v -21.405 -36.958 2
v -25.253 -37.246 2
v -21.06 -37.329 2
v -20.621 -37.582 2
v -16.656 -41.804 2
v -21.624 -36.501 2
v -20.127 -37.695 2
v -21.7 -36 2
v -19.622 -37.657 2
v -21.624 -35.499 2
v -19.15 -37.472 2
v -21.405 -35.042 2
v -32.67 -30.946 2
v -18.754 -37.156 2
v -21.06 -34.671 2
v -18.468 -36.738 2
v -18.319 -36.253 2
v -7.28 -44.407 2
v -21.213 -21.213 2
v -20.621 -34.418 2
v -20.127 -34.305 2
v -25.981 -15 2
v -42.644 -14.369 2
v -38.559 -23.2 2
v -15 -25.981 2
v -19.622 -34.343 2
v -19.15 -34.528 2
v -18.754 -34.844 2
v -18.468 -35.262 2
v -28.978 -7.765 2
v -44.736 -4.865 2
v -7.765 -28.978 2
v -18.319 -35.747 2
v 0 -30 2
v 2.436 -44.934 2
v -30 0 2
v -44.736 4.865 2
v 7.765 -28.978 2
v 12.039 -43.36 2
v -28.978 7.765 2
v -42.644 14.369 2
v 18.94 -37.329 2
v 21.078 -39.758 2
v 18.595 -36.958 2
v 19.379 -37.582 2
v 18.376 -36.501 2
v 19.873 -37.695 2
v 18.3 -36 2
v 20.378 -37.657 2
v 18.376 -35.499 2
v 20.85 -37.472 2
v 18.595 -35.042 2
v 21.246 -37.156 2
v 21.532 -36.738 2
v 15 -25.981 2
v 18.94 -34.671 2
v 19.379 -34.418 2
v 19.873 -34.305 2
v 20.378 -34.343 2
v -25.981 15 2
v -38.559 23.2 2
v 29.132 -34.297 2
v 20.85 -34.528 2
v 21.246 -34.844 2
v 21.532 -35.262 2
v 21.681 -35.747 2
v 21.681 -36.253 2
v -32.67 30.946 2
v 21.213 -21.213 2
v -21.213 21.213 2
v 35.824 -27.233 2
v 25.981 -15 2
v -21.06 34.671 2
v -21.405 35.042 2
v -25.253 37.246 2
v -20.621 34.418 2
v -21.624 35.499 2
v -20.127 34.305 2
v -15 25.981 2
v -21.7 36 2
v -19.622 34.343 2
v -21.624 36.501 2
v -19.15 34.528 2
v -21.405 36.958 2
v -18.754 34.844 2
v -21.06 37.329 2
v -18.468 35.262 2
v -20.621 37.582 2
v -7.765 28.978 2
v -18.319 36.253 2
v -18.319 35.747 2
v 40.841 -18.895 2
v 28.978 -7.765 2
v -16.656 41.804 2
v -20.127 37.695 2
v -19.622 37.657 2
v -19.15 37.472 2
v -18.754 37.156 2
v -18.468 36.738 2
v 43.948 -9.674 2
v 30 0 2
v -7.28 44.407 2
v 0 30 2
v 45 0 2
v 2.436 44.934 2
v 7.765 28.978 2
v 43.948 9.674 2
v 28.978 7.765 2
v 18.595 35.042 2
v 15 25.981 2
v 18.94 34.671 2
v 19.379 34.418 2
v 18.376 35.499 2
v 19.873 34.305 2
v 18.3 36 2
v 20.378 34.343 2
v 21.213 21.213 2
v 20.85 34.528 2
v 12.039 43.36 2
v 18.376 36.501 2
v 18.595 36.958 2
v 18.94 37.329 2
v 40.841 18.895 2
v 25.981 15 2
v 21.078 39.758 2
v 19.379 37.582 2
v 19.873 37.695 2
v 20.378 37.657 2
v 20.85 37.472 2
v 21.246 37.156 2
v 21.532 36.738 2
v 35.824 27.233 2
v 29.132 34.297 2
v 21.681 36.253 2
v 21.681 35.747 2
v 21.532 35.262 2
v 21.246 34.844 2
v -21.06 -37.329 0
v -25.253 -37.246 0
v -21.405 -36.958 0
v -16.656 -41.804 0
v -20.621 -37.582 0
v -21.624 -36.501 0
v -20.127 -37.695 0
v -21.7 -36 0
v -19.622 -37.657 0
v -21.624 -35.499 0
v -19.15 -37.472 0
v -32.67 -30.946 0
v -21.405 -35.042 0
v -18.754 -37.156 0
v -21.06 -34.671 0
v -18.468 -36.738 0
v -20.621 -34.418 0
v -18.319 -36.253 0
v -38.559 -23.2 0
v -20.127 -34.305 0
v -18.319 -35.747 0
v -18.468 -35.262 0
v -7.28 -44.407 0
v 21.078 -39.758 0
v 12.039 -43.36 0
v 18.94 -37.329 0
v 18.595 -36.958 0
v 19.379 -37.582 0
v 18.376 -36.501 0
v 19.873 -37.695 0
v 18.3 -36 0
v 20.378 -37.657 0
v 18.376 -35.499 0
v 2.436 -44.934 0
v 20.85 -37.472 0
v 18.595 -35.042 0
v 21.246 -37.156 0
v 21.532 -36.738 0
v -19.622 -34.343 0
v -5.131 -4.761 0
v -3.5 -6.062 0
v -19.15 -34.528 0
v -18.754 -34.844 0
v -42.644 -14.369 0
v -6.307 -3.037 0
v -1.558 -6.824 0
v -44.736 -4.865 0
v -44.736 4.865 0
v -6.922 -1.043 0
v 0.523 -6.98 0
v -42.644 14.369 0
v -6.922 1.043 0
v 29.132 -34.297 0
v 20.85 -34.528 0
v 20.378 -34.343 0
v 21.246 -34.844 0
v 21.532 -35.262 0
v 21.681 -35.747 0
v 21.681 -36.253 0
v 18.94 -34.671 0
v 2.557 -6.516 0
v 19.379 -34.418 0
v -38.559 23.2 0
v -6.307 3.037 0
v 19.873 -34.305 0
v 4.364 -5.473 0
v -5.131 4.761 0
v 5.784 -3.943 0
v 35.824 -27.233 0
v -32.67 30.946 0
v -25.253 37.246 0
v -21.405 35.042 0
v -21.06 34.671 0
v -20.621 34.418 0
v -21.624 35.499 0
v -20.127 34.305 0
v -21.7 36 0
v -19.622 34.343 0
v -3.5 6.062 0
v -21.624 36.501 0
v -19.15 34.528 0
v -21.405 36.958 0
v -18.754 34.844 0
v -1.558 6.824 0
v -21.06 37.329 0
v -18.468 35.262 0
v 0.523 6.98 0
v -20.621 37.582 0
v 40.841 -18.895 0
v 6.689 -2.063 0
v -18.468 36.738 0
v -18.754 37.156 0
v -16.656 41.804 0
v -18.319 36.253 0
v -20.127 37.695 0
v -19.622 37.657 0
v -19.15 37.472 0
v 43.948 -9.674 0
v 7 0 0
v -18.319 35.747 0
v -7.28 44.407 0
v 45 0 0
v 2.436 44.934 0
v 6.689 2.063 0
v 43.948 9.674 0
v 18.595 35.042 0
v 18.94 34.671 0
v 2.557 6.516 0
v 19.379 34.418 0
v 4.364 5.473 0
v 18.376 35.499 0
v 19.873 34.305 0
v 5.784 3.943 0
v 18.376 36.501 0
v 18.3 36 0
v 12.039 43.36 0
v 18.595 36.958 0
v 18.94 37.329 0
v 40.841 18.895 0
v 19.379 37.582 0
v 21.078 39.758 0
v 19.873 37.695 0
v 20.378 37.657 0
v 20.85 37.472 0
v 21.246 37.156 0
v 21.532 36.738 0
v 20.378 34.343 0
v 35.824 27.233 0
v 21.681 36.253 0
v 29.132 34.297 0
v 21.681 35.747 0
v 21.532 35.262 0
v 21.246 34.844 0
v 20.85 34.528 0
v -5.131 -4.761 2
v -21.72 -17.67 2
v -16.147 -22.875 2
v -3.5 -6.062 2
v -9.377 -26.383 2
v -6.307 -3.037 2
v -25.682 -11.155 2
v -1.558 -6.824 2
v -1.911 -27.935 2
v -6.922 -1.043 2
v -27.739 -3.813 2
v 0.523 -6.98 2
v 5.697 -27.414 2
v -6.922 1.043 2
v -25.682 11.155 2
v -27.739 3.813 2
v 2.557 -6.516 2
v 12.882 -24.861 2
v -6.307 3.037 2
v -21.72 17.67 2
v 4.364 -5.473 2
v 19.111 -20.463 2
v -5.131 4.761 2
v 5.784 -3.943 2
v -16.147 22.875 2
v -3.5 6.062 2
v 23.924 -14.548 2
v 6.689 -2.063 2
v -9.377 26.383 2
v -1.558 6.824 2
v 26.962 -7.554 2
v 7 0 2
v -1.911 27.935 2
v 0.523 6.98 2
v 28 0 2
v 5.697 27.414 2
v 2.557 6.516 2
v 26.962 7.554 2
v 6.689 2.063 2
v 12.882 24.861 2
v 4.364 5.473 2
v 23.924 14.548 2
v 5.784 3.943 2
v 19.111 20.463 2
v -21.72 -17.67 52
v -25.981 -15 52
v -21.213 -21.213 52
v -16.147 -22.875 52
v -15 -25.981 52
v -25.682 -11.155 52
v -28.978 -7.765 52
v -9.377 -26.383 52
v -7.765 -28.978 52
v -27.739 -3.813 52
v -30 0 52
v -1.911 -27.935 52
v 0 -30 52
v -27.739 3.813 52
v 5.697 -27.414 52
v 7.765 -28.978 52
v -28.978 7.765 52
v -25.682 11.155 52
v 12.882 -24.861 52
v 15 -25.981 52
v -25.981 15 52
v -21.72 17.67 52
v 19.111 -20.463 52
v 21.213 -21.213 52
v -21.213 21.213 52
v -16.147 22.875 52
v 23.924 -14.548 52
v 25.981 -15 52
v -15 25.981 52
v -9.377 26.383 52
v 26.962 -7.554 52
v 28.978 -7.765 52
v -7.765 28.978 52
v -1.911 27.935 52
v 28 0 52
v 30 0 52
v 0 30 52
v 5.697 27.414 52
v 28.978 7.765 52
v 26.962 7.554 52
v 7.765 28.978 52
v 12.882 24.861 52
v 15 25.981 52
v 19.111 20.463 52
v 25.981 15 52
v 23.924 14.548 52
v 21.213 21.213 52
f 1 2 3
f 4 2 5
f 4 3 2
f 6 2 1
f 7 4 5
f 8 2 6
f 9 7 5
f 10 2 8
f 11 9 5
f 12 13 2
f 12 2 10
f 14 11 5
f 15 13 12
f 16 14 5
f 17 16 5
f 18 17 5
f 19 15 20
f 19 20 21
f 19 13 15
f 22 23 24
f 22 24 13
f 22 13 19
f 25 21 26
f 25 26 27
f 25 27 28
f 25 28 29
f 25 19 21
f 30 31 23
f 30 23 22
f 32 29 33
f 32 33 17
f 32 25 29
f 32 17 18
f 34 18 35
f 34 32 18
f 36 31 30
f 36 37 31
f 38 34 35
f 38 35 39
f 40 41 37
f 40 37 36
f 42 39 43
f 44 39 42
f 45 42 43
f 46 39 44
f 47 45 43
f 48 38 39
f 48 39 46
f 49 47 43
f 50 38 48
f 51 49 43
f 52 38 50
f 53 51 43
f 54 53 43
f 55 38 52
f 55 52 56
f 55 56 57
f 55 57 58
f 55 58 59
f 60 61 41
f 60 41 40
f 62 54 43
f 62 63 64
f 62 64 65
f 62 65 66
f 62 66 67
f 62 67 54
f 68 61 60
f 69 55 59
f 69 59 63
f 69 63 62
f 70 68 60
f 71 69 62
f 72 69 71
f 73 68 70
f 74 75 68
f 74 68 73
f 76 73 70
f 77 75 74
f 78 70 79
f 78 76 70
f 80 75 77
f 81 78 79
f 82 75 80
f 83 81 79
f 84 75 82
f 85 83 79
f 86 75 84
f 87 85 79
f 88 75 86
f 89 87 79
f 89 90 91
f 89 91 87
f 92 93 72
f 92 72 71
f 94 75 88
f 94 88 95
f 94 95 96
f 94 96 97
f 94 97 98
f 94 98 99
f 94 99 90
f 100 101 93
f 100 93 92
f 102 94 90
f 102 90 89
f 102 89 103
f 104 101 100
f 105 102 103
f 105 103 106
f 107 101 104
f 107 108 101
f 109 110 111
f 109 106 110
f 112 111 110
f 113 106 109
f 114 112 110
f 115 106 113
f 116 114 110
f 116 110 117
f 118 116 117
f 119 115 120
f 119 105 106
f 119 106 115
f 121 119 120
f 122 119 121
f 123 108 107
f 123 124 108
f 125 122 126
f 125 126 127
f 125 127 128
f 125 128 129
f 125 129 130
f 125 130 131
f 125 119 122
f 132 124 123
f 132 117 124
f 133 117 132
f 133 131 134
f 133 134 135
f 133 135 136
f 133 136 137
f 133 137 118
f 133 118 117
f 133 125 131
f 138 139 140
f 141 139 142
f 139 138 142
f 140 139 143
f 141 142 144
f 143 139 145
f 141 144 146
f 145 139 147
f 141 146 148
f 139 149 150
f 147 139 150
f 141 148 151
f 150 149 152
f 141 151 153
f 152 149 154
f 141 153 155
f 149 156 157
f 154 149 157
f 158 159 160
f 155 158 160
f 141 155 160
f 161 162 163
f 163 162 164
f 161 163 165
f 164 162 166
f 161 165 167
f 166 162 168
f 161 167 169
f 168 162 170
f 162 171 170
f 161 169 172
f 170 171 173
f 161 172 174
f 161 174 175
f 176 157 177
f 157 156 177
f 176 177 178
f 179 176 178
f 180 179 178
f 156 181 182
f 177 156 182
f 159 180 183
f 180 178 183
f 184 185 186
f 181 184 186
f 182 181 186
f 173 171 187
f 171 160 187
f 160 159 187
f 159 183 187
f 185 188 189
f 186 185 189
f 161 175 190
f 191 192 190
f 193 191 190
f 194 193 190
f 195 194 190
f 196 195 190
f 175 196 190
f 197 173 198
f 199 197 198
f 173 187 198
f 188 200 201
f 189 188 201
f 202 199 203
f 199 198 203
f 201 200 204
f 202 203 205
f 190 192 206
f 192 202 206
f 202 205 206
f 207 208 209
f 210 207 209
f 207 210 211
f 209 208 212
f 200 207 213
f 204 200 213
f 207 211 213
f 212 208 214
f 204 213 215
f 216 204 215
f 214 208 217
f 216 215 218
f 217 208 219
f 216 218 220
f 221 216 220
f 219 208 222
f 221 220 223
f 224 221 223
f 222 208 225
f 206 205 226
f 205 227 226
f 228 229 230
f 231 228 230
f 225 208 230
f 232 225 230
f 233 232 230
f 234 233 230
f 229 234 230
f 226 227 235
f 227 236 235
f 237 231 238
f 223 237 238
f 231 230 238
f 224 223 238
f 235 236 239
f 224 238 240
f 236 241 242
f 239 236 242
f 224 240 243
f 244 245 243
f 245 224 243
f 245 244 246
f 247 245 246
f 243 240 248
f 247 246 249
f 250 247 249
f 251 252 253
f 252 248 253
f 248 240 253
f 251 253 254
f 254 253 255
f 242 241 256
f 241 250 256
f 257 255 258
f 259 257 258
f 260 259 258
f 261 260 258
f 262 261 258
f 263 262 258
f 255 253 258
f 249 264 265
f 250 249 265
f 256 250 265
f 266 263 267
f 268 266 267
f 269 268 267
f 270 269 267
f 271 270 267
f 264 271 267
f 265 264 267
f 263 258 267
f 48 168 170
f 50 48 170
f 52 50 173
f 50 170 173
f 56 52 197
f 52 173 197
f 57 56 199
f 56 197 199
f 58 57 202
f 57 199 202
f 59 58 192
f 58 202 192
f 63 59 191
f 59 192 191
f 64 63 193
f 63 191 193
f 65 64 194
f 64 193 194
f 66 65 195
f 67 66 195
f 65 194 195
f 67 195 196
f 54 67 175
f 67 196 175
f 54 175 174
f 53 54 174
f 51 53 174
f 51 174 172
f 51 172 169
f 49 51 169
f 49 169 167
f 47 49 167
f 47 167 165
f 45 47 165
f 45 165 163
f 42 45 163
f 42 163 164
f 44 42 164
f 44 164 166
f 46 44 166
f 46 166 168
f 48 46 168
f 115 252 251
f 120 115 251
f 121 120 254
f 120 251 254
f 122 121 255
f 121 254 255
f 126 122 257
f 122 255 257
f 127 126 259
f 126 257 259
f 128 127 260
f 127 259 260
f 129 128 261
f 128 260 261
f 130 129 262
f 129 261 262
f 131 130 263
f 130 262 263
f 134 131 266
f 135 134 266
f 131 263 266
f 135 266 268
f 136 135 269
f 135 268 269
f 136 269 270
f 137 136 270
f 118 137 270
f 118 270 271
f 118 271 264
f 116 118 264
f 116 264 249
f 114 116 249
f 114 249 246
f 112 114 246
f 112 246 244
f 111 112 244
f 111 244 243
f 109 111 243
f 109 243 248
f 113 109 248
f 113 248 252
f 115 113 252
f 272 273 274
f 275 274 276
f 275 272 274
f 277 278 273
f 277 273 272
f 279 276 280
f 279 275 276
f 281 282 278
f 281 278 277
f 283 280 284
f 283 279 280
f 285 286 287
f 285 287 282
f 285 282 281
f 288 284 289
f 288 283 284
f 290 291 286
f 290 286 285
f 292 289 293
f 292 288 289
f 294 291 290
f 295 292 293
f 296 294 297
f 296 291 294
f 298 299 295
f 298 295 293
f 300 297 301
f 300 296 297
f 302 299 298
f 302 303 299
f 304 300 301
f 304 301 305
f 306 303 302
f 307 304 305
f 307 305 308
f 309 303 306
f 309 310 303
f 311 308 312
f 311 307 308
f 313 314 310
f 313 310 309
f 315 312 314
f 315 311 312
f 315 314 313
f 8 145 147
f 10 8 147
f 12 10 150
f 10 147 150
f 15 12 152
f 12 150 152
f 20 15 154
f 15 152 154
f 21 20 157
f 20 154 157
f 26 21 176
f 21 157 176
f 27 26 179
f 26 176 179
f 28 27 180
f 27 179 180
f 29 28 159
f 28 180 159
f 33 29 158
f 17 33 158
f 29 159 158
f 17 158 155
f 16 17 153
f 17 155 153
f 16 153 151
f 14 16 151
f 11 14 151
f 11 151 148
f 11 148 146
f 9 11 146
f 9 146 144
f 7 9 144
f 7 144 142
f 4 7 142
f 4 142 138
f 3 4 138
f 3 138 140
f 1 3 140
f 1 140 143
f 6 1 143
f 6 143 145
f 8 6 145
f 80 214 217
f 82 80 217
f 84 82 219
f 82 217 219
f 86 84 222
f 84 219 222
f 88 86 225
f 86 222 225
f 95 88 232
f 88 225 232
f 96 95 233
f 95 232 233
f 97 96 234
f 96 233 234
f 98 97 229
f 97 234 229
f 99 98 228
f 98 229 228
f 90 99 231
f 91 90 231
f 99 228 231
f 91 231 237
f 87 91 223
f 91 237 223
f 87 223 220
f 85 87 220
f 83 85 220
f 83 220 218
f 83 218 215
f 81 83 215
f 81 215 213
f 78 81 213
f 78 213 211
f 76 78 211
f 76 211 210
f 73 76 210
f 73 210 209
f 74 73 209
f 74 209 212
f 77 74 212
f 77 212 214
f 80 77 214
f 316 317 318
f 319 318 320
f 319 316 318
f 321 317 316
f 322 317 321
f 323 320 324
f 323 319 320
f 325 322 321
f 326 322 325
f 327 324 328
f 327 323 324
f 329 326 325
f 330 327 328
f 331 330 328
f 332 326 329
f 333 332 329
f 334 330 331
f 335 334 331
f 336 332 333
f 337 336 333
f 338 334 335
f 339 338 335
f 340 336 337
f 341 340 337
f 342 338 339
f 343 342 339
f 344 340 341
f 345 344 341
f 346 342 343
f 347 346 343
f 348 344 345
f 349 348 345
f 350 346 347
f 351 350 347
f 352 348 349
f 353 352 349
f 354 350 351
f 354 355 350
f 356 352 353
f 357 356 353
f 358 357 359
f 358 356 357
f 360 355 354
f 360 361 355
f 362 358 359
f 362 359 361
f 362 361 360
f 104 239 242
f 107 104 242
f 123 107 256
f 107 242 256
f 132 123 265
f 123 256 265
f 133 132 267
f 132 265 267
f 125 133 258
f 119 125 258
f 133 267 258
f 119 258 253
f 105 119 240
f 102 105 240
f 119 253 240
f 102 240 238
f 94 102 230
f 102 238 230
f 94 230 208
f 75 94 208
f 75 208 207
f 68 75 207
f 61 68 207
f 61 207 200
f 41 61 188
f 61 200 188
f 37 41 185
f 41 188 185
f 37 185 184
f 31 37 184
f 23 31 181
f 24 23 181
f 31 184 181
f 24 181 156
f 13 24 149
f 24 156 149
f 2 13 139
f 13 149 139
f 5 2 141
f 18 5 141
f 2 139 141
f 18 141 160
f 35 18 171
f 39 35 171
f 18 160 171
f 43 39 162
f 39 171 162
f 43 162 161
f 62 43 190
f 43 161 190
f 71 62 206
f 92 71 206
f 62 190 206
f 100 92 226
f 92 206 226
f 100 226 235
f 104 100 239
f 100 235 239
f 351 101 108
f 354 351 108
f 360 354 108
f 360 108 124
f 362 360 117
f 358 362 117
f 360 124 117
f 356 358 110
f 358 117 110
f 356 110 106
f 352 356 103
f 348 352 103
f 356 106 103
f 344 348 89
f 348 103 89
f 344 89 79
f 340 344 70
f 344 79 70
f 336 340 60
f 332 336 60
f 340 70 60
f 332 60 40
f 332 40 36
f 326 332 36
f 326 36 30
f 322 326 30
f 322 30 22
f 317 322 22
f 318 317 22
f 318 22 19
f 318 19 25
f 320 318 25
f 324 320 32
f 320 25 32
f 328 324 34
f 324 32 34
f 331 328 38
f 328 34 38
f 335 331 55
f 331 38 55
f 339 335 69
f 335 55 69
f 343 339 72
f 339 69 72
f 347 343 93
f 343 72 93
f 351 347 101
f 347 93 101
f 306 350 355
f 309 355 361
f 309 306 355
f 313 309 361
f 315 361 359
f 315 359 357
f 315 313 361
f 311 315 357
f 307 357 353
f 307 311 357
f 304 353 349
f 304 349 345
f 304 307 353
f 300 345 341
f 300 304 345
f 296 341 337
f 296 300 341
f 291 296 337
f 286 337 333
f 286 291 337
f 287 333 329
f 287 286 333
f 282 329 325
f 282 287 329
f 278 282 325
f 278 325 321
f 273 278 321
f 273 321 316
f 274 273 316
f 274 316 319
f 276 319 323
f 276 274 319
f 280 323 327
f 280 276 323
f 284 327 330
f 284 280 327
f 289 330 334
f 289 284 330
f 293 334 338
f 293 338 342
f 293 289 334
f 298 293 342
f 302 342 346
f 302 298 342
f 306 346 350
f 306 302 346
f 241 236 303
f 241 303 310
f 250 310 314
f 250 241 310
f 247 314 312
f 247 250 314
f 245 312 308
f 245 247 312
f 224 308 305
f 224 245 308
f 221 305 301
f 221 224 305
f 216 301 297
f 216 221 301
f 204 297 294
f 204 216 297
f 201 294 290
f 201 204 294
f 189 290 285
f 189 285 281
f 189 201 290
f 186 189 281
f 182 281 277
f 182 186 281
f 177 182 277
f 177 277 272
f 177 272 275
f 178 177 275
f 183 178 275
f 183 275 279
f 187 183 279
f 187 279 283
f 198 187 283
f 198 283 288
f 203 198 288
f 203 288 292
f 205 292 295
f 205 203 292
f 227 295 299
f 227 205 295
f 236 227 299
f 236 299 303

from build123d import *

# Parameters (mm, degrees)
SKETCH1_R                        = 45
SKETCH1_R_2                      = 7
GUARD_FLANGE_DEPTH               = 2
COUPLING_CONTACT_COVER_START     = 2
SKETCH2_R                        = 30
SKETCH2_R_2                      = 28
COUPLING_CONTACT_COVER_DEPTH     = 50
SKETCH3_R                        = 1.7
FOUR_M3_GUARD_FIXING_HOLES_DEPTH = 2.01


with BuildPart() as part:
    # Sketch1 → Guard_Flange (new body)
    with BuildSketch(Plane.XY):
        Circle(SKETCH1_R)
        Circle(SKETCH1_R_2, mode=Mode.SUBTRACT)
    extrude(amount=GUARD_FLANGE_DEPTH)

    # Sketch2 → Coupling_Contact_Cover (add)
    with BuildSketch(Plane.XY.offset(COUPLING_CONTACT_COVER_START)):
        Circle(SKETCH2_R)
        Circle(SKETCH2_R_2, mode=Mode.SUBTRACT)
    extrude(amount=COUPLING_CONTACT_COVER_DEPTH)

    # Sketch3 → Four_M3_Guard_Fixing_Holes (cut)
    with BuildSketch(Plane(origin=(0, 0, 0), x_dir=(-1, 0, 0), z_dir=(0, 0, -1))):
        with Locations((20, -36)):
            Circle(SKETCH3_R)
        with Locations((20, 36)):
            Circle(SKETCH3_R)
        with Locations((-20, -36)):
            Circle(SKETCH3_R)
        with Locations((-20, 36)):
            Circle(SKETCH3_R)
    extrude(amount=-FOUR_M3_GUARD_FIXING_HOLES_DEPTH, mode=Mode.SUBTRACT)


solid = part.part
